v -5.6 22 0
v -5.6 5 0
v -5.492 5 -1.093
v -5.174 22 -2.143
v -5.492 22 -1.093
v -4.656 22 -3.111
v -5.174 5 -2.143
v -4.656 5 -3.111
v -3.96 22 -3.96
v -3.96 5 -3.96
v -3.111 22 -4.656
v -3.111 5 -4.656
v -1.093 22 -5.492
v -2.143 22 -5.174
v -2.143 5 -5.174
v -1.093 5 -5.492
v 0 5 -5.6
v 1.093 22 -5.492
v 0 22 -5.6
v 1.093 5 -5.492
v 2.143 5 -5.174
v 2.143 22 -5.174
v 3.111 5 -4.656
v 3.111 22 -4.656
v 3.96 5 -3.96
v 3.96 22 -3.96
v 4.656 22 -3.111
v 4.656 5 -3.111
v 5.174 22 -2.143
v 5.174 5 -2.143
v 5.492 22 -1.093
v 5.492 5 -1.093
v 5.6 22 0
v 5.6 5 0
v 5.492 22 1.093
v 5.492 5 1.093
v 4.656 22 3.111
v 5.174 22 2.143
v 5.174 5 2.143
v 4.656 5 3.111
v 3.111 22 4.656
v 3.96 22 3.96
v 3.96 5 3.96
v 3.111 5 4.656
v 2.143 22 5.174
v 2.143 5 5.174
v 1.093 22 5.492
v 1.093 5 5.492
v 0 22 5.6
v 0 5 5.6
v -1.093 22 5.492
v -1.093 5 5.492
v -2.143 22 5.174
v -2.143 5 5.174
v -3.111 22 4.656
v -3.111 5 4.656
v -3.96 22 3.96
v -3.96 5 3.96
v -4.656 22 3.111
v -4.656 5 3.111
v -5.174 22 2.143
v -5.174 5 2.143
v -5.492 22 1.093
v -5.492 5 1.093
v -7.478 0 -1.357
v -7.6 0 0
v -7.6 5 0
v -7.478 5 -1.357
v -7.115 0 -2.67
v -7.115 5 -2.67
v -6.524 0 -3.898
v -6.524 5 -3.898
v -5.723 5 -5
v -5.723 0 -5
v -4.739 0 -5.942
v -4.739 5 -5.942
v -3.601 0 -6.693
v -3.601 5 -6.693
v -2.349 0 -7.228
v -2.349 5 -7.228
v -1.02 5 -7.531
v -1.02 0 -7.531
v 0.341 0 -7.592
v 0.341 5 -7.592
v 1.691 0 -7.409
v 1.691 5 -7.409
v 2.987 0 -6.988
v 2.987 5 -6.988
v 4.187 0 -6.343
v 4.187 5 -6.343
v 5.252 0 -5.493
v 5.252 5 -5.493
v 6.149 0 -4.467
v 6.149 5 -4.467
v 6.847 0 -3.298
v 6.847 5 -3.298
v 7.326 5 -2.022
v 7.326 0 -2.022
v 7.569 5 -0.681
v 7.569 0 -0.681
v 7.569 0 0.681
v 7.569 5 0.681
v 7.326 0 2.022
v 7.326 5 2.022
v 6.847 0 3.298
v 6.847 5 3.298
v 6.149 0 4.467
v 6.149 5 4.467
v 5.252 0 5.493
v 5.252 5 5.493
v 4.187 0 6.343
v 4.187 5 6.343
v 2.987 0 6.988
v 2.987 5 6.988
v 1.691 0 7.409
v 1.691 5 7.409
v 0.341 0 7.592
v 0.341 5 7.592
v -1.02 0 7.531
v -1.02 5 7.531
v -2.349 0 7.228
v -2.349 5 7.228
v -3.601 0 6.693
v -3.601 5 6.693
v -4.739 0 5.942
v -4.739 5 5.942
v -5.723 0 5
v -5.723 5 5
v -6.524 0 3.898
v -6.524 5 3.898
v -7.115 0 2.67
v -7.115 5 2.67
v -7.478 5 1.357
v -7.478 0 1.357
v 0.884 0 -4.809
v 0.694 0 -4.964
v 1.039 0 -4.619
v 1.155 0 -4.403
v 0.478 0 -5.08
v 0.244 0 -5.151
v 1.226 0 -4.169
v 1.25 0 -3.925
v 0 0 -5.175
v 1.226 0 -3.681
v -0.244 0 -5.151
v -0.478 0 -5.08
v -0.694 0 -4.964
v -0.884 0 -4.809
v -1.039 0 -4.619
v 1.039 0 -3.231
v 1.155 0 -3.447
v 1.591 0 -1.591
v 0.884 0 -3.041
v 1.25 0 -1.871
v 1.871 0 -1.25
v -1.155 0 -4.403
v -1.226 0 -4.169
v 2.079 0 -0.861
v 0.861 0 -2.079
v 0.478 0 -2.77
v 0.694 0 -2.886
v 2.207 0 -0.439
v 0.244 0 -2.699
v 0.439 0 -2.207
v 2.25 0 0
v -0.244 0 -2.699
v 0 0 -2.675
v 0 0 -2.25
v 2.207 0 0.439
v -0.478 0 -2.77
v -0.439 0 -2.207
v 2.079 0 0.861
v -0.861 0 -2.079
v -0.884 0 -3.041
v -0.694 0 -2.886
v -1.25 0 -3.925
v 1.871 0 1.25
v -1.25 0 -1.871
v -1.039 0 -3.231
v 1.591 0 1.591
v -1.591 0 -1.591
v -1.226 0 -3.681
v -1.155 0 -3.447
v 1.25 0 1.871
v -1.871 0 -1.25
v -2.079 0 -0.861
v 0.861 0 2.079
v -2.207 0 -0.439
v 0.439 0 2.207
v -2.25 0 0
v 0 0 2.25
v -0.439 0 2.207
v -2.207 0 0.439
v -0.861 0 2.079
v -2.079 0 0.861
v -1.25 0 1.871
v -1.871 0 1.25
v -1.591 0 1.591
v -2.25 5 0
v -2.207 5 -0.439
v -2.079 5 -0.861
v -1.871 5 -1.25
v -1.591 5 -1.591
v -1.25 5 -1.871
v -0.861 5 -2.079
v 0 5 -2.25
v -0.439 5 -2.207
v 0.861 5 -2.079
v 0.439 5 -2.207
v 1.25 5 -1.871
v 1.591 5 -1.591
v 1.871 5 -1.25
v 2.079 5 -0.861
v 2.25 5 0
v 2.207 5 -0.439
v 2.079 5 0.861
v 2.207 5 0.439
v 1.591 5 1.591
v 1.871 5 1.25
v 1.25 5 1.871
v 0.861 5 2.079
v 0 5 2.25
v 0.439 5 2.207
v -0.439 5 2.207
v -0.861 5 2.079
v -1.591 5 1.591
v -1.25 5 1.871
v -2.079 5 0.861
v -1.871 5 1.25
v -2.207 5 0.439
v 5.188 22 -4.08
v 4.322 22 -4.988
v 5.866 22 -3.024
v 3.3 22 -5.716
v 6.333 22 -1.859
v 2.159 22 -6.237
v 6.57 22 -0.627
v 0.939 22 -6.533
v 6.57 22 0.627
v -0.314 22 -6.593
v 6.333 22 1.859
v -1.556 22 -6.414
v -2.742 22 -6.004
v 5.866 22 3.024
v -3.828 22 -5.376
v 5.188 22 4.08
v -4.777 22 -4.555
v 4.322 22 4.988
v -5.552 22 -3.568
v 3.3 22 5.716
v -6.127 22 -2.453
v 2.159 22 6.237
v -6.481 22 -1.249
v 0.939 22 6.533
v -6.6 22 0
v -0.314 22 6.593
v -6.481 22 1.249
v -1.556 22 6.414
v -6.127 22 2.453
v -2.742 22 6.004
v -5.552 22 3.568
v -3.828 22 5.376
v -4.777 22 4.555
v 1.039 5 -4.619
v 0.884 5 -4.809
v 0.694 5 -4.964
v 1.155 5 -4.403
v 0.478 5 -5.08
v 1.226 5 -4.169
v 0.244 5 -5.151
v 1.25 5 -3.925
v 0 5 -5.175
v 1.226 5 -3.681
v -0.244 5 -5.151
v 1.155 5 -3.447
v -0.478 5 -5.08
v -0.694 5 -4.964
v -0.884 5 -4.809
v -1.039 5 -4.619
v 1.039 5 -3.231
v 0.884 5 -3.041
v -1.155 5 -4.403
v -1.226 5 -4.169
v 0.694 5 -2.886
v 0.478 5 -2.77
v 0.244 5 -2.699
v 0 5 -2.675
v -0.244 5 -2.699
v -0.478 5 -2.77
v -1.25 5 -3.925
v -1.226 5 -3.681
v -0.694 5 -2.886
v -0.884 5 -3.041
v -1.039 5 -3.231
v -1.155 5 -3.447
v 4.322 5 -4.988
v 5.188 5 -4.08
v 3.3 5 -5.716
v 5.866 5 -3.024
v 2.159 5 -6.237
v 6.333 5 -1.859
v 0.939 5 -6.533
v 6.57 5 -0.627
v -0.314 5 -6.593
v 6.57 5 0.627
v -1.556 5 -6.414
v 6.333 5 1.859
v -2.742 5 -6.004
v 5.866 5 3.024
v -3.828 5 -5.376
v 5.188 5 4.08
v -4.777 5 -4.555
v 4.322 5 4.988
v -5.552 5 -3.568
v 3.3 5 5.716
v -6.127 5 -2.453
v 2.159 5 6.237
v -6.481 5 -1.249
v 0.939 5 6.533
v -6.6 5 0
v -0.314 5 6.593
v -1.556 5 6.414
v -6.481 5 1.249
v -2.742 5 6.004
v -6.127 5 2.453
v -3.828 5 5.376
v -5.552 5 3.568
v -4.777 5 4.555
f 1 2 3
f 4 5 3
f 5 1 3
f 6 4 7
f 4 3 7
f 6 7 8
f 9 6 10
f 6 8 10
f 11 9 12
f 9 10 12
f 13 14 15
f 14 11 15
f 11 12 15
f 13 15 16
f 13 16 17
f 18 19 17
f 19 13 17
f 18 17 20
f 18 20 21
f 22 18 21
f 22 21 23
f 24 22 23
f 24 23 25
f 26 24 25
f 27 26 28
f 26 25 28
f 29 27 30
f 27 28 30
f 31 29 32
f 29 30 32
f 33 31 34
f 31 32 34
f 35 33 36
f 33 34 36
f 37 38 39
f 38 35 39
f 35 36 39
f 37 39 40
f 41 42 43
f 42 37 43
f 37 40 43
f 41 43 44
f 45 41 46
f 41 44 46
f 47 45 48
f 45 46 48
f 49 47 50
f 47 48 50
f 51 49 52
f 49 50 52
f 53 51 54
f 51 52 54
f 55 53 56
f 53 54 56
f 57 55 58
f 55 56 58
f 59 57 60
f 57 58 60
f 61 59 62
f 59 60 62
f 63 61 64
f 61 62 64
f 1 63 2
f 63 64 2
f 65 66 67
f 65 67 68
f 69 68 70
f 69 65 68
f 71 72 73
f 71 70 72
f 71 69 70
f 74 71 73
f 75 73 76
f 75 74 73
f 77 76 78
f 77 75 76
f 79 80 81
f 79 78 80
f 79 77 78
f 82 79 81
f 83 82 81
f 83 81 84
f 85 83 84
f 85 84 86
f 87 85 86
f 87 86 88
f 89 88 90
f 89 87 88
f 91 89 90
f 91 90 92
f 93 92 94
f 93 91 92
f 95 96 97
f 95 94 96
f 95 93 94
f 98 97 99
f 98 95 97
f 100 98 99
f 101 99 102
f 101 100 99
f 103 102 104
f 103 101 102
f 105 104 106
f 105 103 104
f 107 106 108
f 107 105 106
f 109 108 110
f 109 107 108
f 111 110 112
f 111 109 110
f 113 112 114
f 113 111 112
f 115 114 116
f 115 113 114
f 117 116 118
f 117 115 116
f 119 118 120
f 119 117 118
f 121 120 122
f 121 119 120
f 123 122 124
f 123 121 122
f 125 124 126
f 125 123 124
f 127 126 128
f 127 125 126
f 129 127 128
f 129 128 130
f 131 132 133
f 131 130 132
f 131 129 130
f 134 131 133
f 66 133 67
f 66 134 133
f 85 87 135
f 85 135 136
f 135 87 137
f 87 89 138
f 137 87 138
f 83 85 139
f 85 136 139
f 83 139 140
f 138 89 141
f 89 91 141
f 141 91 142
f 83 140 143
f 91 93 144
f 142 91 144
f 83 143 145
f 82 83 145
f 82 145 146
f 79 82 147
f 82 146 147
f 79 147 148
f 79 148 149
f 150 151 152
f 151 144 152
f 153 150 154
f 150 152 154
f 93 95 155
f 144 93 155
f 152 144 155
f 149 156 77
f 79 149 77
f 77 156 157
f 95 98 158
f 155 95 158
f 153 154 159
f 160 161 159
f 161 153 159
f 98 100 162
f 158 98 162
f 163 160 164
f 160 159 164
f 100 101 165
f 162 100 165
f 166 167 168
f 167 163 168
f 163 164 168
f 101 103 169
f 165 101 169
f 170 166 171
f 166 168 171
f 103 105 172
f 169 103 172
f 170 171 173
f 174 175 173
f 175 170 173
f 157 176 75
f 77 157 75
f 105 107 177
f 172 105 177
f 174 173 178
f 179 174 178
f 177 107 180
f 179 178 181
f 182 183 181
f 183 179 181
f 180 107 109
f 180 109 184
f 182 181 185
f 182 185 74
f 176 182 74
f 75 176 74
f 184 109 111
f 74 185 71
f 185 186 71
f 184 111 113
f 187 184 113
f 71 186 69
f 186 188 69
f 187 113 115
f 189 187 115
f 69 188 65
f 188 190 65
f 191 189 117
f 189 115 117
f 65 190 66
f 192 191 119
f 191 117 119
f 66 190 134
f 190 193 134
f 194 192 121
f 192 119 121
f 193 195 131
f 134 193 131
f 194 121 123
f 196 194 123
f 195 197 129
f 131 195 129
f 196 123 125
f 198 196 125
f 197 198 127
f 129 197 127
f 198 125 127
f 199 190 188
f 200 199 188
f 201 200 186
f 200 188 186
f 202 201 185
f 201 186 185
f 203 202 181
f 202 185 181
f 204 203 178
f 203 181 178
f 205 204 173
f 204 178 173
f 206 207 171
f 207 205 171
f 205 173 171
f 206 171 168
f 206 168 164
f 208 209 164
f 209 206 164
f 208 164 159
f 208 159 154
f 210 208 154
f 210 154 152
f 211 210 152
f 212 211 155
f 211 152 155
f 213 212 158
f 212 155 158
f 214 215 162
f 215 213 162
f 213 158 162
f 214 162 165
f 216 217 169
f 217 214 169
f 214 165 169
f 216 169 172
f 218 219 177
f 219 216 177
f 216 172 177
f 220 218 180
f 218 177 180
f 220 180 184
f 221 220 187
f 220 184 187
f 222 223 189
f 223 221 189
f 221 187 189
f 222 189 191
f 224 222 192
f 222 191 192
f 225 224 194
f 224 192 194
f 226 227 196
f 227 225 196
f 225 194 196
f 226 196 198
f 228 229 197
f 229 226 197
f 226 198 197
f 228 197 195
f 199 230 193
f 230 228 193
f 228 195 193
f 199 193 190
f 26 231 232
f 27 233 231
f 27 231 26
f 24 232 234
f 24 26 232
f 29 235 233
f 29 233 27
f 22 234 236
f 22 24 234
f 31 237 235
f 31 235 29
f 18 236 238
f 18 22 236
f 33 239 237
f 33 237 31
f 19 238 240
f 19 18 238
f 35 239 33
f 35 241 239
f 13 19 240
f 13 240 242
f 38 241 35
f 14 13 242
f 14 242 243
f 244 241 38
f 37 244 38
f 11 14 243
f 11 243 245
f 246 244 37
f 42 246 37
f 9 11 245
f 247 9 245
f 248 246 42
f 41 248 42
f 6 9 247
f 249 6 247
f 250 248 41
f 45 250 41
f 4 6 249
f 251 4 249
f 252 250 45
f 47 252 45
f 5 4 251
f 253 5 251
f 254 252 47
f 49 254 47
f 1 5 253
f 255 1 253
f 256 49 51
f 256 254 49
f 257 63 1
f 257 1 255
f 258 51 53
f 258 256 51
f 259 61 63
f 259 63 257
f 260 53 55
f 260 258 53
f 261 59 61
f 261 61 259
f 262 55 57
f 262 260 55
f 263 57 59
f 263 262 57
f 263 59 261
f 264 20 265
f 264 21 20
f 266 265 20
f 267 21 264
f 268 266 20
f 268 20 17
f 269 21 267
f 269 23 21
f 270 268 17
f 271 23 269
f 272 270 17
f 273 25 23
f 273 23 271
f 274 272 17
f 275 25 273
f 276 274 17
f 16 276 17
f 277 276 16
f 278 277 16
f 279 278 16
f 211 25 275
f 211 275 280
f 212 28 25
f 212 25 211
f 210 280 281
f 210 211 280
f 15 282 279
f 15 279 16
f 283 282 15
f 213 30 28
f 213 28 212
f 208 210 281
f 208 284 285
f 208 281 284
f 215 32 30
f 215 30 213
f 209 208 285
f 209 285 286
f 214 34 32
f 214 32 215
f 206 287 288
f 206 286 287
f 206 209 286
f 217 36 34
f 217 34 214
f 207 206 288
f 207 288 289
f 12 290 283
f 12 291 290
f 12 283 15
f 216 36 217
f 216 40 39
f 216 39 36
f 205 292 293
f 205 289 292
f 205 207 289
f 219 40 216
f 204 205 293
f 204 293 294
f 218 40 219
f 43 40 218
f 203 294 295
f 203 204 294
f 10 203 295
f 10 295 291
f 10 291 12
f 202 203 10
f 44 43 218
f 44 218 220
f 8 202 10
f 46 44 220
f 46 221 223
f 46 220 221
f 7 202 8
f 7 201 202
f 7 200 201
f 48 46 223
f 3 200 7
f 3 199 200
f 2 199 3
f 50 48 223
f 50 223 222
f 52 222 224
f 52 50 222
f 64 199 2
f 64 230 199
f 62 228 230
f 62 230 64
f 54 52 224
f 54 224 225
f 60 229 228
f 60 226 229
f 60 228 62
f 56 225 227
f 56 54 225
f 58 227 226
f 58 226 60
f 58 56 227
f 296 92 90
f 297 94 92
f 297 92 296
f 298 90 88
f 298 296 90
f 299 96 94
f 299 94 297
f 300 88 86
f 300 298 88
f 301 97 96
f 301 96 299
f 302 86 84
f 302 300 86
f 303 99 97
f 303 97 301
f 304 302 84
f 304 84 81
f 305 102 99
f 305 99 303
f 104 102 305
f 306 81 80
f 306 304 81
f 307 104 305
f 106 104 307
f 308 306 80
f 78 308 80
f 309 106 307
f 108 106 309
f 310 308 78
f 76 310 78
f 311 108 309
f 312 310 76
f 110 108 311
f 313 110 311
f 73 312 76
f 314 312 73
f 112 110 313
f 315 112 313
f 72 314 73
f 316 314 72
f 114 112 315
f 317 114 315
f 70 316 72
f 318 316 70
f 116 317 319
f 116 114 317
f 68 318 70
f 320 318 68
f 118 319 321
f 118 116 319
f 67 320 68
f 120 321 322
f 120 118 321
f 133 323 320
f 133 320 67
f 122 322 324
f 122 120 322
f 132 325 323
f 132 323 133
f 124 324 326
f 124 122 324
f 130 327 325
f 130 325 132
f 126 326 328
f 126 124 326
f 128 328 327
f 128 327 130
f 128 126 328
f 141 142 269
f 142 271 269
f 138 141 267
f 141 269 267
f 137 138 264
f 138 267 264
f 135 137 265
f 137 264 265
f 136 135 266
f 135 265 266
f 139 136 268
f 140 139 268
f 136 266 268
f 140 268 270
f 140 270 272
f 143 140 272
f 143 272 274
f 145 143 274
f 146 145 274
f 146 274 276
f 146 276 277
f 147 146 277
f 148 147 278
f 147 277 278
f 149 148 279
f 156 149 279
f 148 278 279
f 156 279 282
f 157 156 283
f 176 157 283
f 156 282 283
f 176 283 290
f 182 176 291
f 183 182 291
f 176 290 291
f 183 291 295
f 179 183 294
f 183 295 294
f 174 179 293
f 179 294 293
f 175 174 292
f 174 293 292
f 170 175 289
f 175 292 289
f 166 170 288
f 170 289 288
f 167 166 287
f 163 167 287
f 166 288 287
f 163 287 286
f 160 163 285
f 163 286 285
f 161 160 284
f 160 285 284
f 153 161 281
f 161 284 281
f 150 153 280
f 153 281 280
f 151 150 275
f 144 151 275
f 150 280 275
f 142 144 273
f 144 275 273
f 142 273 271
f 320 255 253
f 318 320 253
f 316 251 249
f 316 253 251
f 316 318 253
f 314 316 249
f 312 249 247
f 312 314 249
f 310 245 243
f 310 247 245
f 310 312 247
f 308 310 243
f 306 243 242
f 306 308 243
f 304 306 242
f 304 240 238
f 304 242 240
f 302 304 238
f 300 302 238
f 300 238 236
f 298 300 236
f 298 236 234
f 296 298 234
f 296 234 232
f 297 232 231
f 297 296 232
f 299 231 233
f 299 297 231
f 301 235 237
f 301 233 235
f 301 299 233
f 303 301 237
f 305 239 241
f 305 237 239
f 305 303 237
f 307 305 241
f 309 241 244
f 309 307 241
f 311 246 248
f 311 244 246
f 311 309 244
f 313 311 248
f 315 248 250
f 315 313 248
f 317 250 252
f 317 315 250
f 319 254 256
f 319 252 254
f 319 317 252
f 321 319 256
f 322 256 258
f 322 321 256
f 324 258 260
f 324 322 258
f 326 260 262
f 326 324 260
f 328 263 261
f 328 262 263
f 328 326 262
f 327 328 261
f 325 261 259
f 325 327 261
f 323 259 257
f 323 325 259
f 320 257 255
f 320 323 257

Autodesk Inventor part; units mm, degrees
ref_plane "YZ Plane" through (0, 0, 0) normal (1, 0, 0) x (0, 1, 0)
ref_plane "XZ Plane" through (0, 0, 0) normal (0, 1, 0) x (-1, 0, 0)
ref_plane "XY Plane" through (0, 0, 0) normal (0, 0, 1) x (1, 0, 0)
sketch "Sketch1" plane through (0, 0, 0) normal (0, 1, 0) x (-1, 0, 0)
  circle A0 centre (0, 0) radius 5.6
  circle A1 centre (0, 0) radius 2.25
  circle A2 centre (0, 0) radius 6.6
  circle A3 centre (0, 0) radius 7.6
  dimension "d0" = 11.2
  dimension "d1" = 4.5
  dimension "d6" = 1
  dimension "d7" = 1
extrude "Extrusion1" add sketch "Sketch1" along normal blind 5 contours A0 | A2 | A3
extrude "Extrusion3" add sketch "Sketch1" along normal blind 17 from surface at 5 contours A2
sketch "Sketch4" plane through (0, 5, 0) normal (0, 1, 0) x (1, 0, 0)
  circle A0 centre (0, 3.925) radius 1.25
  circle A1 centre (0, 0) radius 2.25 projected
  line L0 (0, 2.25) -> (0, 5.6) construction
  circle A2 centre (0, 0) radius 5.6 projected
  dimension "d19" = 2.5
extrude "Extrusion5" cut sketch "Sketch4" against normal up to surface (5 mm away) contours A0
properties part number "button middle part 2"
